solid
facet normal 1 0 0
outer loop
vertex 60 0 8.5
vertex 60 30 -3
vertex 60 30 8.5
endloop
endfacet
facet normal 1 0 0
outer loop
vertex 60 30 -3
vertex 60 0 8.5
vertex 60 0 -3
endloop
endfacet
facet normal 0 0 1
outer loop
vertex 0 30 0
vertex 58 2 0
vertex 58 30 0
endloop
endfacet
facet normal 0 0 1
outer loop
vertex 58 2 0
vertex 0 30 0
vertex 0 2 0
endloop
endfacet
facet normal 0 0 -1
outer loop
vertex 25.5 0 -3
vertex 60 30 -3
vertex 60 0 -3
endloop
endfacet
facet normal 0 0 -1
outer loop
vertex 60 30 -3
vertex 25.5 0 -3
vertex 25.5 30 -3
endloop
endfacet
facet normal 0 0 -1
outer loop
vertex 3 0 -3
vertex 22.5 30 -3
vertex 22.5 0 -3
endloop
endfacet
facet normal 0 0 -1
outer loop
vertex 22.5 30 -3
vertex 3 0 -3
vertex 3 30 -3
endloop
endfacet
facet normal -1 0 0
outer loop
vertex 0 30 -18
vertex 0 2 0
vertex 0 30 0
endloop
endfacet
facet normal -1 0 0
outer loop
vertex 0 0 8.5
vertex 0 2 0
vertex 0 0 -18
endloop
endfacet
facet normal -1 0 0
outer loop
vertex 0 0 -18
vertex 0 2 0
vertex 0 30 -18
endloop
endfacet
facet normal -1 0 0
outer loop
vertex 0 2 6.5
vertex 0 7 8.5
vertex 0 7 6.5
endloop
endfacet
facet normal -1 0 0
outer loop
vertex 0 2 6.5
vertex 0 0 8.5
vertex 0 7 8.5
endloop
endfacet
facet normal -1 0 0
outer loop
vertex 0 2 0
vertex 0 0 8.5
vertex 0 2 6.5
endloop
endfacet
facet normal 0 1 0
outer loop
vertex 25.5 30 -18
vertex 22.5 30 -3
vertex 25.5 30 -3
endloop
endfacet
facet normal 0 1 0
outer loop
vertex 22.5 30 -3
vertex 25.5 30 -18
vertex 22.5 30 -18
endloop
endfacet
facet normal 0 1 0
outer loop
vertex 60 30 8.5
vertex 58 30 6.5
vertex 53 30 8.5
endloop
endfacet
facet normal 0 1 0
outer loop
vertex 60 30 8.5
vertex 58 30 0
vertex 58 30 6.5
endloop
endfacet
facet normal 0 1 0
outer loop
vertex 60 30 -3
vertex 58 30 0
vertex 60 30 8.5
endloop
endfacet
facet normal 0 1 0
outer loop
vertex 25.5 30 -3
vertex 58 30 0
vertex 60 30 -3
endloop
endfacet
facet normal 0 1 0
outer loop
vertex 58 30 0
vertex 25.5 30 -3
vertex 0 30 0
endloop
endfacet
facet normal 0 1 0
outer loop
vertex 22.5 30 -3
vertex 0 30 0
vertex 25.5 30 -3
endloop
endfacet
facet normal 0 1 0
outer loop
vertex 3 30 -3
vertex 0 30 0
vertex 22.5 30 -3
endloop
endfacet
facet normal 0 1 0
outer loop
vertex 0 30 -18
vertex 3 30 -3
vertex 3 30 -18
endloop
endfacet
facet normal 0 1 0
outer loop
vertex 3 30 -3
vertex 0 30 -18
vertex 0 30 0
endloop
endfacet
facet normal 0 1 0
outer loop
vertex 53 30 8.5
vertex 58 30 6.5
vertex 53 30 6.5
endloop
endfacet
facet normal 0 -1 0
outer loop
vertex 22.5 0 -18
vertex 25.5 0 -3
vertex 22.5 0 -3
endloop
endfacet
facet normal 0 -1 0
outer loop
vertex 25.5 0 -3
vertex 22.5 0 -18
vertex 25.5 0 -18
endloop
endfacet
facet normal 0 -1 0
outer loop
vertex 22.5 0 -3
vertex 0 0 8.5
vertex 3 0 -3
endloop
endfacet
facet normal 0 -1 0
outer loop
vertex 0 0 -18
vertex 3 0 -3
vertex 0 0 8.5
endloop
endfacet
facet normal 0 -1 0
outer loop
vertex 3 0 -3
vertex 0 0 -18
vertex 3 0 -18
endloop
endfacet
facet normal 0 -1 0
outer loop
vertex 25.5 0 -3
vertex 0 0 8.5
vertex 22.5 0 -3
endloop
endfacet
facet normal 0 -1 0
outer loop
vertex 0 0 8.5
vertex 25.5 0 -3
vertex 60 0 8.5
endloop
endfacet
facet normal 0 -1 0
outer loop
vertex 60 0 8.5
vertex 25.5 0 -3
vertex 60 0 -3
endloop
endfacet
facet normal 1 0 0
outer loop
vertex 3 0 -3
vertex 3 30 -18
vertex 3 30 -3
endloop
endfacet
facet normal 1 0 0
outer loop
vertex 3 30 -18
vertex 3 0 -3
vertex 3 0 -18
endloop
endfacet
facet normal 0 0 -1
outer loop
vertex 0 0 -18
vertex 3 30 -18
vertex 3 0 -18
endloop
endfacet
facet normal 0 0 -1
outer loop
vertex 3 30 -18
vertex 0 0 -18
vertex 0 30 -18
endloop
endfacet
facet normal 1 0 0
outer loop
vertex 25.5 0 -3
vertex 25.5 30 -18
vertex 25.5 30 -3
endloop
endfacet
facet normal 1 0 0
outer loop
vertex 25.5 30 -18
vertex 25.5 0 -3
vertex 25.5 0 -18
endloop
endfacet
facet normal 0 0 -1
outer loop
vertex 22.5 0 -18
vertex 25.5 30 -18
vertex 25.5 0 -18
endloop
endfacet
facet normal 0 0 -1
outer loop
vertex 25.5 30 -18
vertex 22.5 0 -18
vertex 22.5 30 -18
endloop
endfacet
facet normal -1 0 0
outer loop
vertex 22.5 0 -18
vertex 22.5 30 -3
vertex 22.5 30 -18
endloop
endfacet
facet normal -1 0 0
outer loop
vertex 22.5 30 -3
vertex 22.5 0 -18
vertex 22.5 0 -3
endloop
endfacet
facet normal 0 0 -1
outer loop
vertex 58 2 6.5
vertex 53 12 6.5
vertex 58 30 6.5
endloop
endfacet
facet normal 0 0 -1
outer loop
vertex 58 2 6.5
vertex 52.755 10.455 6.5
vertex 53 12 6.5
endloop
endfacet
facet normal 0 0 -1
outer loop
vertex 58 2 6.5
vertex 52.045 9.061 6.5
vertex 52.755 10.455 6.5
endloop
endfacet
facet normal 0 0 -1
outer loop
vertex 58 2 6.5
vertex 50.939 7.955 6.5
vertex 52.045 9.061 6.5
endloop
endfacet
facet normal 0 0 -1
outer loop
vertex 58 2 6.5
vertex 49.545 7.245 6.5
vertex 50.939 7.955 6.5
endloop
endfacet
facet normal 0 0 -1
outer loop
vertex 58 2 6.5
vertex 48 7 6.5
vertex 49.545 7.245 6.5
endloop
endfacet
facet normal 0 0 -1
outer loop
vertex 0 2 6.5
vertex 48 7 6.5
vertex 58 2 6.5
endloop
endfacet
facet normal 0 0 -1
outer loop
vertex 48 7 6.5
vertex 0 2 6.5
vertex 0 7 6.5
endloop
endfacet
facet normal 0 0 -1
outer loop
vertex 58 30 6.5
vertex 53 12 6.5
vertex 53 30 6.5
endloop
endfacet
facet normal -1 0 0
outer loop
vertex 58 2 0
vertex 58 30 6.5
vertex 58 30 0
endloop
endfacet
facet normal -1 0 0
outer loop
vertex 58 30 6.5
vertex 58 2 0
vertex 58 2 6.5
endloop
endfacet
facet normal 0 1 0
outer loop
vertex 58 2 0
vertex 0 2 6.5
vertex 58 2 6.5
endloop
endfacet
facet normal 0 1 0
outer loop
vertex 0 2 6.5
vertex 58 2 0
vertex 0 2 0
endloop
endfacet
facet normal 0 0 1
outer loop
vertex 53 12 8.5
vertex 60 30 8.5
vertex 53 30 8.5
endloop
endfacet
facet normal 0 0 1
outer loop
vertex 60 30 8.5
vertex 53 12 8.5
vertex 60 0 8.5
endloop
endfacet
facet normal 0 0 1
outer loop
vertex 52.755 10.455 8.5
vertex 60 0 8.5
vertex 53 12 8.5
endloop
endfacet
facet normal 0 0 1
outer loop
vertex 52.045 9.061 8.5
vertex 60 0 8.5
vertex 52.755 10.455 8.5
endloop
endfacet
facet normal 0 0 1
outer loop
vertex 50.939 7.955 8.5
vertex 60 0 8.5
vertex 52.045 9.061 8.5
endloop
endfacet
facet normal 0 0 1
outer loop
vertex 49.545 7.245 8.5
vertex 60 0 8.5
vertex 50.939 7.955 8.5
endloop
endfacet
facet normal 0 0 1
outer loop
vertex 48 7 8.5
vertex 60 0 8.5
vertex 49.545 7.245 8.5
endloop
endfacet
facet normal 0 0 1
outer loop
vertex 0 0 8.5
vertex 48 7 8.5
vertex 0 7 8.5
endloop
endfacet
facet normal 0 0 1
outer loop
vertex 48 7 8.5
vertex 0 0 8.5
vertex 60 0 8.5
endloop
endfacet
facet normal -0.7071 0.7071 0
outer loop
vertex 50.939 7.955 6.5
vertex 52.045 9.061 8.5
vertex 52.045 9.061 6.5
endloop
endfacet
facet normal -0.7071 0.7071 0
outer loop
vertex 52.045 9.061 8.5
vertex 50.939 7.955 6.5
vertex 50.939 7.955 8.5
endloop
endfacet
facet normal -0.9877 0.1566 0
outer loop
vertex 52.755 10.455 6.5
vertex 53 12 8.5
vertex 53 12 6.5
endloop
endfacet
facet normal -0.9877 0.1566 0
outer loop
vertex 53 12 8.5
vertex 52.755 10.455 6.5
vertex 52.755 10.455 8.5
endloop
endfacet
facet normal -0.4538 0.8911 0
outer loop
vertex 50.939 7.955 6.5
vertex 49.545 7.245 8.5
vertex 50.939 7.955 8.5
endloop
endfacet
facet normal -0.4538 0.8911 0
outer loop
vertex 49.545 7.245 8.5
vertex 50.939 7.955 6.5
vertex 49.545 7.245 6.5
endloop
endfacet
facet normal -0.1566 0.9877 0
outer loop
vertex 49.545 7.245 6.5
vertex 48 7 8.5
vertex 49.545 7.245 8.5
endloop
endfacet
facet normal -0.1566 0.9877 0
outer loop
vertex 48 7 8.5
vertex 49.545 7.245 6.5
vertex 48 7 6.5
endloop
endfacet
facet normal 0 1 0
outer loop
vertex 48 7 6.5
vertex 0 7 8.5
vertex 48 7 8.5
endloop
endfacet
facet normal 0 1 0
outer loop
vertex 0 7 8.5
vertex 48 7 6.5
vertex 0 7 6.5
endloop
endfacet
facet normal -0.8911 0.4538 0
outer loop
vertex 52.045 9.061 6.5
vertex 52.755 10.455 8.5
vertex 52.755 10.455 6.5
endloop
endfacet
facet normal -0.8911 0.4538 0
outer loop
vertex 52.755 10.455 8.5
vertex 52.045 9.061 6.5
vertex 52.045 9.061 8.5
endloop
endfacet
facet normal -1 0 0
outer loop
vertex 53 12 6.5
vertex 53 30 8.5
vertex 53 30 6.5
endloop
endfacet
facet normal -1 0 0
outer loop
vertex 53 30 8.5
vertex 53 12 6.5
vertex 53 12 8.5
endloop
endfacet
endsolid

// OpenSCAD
cd = 15; // claw depth
cth = 3; // claw thickness
bth = 3; // back plate thickness
fsz = 5; // frame size (the ipad blocker in the front)
fth = 2; // frame thickness (the ipad blocker in the front)
sfsz = 2;// support frame size (the one surround ipad)


h = 60;
l = 30;
nsz = 0; // faceid notch size 15

pth = 6.5;// ipad thickness + tolerance
dth = 19.5;// desk thickness + tolerance

module back_plate() {
    translate([0,0,-bth]) cube([h,l,bth]);
    translate([0,0,-(bth+cd)]) cube([cth,l,bth+cd]);
    translate([dth+cth,0,-(bth+cd)]) cube([cth,l,bth+cd]);
}

module front_frame() {
    difference() {
        cube([h,l,pth]);
        translate([-sfsz,sfsz,0]) cube([h,l,pth]);
    }

    translate([0,0,pth]) difference() {
        cube([h,l,fth]);
        $fn=20; translate([-fsz-sfsz,fsz+sfsz,0]) minkowski() {
            rr = 5; // round corner radius
            rd = rr*2;
            translate([rr,rr,0]) cube([h-rd,l-rd,fth]);
            cylinder(r=rr,h=0.001);
        }
        large = 300; translate([0,sfsz,0]) cube([nsz,large,fth]);
    }
}

module ipad_mount() {
    intersection() {
        large = 300;
        union() { back_plate(); front_frame(); }
        $fn=20; translate([0,0,-large]) minkowski() {
            rr = 0; // round corner radius
            rd = rr*2;
            translate([rr-large,rr,0]) cube([h-rd+large,l-rd+large,fth+pth+large]);
            cylinder(r=rr,h=0.001);
        }
    }
}

rotate([90,0,0]) !ipad_mount();
translate([0,40,0]) mirror([0,1,0]) rotate([90,0,0]) ipad_mount();
